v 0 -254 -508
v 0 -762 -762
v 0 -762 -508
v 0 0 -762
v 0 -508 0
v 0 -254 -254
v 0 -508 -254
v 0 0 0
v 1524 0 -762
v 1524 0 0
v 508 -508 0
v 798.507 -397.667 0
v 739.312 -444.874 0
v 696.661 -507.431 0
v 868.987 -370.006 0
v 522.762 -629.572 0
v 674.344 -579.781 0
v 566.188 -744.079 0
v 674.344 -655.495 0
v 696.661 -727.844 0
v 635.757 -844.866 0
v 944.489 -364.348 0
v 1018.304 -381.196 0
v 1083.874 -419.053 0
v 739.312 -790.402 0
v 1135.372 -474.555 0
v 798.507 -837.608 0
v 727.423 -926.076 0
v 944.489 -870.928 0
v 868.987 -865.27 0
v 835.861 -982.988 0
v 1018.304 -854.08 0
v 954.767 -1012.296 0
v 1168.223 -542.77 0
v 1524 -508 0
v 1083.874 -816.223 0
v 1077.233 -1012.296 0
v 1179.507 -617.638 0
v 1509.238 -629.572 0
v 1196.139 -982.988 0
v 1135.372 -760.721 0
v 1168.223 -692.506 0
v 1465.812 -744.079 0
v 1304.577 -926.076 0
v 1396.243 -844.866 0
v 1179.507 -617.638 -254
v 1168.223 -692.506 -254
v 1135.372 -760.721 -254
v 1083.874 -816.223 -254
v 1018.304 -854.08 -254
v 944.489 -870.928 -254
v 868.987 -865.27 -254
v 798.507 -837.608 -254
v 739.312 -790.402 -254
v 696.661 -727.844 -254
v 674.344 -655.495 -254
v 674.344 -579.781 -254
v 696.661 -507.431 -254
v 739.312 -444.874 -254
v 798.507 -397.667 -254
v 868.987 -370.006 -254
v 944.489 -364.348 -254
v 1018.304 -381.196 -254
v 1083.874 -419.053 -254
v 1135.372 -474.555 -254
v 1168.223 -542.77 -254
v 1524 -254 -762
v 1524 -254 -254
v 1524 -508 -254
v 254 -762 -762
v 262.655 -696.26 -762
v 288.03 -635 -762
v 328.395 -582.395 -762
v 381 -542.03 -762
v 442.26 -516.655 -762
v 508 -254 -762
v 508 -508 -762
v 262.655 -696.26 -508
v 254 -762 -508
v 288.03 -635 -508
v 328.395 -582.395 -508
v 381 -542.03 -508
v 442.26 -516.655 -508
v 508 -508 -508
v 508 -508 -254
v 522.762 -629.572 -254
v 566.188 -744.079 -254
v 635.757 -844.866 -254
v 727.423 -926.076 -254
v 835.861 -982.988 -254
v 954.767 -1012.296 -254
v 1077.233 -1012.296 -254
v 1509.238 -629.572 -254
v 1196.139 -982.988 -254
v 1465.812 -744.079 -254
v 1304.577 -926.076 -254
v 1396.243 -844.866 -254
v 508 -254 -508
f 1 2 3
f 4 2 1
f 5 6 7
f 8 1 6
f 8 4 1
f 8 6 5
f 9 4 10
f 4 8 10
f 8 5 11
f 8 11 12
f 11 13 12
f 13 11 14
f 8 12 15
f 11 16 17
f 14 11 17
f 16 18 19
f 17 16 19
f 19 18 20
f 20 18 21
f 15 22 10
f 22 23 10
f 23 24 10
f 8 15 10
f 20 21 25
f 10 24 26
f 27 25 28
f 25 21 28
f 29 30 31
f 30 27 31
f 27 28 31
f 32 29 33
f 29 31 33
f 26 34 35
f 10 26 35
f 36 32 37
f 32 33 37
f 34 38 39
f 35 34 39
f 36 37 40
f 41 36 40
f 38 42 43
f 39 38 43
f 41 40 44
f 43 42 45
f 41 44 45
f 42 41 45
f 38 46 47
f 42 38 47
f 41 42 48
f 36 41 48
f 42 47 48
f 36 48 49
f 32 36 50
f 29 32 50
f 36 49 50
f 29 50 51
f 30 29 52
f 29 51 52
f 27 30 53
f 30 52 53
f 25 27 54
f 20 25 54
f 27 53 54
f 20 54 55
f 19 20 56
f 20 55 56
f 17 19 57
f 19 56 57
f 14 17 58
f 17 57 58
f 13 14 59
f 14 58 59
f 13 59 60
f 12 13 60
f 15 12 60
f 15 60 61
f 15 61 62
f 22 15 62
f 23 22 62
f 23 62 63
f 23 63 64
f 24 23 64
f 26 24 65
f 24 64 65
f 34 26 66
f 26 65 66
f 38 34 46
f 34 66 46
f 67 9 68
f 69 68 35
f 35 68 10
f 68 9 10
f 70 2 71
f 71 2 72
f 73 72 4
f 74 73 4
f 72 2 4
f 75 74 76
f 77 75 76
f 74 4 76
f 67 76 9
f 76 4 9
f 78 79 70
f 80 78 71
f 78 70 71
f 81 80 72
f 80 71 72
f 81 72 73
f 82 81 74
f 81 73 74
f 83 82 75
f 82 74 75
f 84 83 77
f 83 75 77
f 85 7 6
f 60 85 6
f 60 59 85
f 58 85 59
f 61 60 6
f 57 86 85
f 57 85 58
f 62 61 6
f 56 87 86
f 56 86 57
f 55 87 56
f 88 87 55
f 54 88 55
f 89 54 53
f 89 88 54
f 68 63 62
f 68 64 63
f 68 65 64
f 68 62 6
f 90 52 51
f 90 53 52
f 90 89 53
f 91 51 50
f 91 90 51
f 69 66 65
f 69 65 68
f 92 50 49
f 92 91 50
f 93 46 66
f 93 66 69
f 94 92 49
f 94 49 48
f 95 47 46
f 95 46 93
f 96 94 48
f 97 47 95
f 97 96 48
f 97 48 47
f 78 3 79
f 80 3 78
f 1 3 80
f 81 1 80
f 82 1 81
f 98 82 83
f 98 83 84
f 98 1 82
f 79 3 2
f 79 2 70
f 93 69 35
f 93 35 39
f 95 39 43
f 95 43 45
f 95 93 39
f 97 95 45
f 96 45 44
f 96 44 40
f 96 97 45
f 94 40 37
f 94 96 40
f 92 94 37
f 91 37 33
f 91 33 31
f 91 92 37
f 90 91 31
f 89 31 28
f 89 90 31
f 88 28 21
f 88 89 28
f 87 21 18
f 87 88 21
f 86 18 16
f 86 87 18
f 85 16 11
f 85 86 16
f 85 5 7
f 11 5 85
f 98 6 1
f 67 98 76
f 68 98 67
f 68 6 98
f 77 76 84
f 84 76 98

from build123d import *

# Parameters (mm, degrees)
F1_DEPTH  = 254
F0_W      = 508
F0_H      = 254
F2_DEPTH  = 762
F4_DEPTH  = 254
F5_W      = 1524
F5_H      = 254
F6_DEPTH  = 254
F8_DEPTH  = 254
F9_R      = 254
F10_DEPTH = 254


with BuildPart() as f1:
    # F0 (on Front) → F1 (new body)
    with BuildSketch(Plane.XZ):
        Polygon((0, 0), (0, -508), (508, -508), (508, -762), (1524, -762), (1524, 0), align=None)
    extrude(amount=F1_DEPTH)

    # F0 (on Front) → F2 (join)
    with BuildSketch(Plane.XZ):
        with Locations((254, -635)):
            Rectangle(F0_W, F0_H)
    extrude(amount=F2_DEPTH)

    # F3 (on face) → F4 (cut)
    with BuildSketch(Plane(origin=(0, 0, -762), x_dir=(1, 0, 0), z_dir=(0, 0, -1))):
        with BuildLine():
            ThreePointArc((254, 762), (328.394878, 582.394878), (508, 508))
            Line((508, 508), (508, 762))
            Line((508, 762), (254, 762))
        make_face()
    extrude(amount=-F4_DEPTH, mode=Mode.SUBTRACT)

    # F5 (on face) → F6 (join)
    with BuildSketch(Plane.XZ.offset(254)):
        with Locations((762, -127)):
            Rectangle(F5_W, F5_H)
    extrude(amount=F6_DEPTH)

    # F7 (on face) → F8 (join)
    with BuildSketch(Plane(origin=(0, 0, -254), x_dir=(1, 0, 0), z_dir=(0, 0, -1))):
        with BuildLine():
            Line((508, 508), (1524, 508))
            ThreePointArc((1524, 508), (1016, 1016), (508, 508))
        make_face()
    extrude(amount=-F8_DEPTH)

    # F9 (on face) → F10 (cut)
    with BuildSketch(Plane(origin=(0, 0, -254), x_dir=(1, 0, 0), z_dir=(0, 0, -1))):
        with Locations((925.507426, 617.637932)):
            Circle(F9_R)
    extrude(amount=-F10_DEPTH, mode=Mode.SUBTRACT)


solid = f1.part
